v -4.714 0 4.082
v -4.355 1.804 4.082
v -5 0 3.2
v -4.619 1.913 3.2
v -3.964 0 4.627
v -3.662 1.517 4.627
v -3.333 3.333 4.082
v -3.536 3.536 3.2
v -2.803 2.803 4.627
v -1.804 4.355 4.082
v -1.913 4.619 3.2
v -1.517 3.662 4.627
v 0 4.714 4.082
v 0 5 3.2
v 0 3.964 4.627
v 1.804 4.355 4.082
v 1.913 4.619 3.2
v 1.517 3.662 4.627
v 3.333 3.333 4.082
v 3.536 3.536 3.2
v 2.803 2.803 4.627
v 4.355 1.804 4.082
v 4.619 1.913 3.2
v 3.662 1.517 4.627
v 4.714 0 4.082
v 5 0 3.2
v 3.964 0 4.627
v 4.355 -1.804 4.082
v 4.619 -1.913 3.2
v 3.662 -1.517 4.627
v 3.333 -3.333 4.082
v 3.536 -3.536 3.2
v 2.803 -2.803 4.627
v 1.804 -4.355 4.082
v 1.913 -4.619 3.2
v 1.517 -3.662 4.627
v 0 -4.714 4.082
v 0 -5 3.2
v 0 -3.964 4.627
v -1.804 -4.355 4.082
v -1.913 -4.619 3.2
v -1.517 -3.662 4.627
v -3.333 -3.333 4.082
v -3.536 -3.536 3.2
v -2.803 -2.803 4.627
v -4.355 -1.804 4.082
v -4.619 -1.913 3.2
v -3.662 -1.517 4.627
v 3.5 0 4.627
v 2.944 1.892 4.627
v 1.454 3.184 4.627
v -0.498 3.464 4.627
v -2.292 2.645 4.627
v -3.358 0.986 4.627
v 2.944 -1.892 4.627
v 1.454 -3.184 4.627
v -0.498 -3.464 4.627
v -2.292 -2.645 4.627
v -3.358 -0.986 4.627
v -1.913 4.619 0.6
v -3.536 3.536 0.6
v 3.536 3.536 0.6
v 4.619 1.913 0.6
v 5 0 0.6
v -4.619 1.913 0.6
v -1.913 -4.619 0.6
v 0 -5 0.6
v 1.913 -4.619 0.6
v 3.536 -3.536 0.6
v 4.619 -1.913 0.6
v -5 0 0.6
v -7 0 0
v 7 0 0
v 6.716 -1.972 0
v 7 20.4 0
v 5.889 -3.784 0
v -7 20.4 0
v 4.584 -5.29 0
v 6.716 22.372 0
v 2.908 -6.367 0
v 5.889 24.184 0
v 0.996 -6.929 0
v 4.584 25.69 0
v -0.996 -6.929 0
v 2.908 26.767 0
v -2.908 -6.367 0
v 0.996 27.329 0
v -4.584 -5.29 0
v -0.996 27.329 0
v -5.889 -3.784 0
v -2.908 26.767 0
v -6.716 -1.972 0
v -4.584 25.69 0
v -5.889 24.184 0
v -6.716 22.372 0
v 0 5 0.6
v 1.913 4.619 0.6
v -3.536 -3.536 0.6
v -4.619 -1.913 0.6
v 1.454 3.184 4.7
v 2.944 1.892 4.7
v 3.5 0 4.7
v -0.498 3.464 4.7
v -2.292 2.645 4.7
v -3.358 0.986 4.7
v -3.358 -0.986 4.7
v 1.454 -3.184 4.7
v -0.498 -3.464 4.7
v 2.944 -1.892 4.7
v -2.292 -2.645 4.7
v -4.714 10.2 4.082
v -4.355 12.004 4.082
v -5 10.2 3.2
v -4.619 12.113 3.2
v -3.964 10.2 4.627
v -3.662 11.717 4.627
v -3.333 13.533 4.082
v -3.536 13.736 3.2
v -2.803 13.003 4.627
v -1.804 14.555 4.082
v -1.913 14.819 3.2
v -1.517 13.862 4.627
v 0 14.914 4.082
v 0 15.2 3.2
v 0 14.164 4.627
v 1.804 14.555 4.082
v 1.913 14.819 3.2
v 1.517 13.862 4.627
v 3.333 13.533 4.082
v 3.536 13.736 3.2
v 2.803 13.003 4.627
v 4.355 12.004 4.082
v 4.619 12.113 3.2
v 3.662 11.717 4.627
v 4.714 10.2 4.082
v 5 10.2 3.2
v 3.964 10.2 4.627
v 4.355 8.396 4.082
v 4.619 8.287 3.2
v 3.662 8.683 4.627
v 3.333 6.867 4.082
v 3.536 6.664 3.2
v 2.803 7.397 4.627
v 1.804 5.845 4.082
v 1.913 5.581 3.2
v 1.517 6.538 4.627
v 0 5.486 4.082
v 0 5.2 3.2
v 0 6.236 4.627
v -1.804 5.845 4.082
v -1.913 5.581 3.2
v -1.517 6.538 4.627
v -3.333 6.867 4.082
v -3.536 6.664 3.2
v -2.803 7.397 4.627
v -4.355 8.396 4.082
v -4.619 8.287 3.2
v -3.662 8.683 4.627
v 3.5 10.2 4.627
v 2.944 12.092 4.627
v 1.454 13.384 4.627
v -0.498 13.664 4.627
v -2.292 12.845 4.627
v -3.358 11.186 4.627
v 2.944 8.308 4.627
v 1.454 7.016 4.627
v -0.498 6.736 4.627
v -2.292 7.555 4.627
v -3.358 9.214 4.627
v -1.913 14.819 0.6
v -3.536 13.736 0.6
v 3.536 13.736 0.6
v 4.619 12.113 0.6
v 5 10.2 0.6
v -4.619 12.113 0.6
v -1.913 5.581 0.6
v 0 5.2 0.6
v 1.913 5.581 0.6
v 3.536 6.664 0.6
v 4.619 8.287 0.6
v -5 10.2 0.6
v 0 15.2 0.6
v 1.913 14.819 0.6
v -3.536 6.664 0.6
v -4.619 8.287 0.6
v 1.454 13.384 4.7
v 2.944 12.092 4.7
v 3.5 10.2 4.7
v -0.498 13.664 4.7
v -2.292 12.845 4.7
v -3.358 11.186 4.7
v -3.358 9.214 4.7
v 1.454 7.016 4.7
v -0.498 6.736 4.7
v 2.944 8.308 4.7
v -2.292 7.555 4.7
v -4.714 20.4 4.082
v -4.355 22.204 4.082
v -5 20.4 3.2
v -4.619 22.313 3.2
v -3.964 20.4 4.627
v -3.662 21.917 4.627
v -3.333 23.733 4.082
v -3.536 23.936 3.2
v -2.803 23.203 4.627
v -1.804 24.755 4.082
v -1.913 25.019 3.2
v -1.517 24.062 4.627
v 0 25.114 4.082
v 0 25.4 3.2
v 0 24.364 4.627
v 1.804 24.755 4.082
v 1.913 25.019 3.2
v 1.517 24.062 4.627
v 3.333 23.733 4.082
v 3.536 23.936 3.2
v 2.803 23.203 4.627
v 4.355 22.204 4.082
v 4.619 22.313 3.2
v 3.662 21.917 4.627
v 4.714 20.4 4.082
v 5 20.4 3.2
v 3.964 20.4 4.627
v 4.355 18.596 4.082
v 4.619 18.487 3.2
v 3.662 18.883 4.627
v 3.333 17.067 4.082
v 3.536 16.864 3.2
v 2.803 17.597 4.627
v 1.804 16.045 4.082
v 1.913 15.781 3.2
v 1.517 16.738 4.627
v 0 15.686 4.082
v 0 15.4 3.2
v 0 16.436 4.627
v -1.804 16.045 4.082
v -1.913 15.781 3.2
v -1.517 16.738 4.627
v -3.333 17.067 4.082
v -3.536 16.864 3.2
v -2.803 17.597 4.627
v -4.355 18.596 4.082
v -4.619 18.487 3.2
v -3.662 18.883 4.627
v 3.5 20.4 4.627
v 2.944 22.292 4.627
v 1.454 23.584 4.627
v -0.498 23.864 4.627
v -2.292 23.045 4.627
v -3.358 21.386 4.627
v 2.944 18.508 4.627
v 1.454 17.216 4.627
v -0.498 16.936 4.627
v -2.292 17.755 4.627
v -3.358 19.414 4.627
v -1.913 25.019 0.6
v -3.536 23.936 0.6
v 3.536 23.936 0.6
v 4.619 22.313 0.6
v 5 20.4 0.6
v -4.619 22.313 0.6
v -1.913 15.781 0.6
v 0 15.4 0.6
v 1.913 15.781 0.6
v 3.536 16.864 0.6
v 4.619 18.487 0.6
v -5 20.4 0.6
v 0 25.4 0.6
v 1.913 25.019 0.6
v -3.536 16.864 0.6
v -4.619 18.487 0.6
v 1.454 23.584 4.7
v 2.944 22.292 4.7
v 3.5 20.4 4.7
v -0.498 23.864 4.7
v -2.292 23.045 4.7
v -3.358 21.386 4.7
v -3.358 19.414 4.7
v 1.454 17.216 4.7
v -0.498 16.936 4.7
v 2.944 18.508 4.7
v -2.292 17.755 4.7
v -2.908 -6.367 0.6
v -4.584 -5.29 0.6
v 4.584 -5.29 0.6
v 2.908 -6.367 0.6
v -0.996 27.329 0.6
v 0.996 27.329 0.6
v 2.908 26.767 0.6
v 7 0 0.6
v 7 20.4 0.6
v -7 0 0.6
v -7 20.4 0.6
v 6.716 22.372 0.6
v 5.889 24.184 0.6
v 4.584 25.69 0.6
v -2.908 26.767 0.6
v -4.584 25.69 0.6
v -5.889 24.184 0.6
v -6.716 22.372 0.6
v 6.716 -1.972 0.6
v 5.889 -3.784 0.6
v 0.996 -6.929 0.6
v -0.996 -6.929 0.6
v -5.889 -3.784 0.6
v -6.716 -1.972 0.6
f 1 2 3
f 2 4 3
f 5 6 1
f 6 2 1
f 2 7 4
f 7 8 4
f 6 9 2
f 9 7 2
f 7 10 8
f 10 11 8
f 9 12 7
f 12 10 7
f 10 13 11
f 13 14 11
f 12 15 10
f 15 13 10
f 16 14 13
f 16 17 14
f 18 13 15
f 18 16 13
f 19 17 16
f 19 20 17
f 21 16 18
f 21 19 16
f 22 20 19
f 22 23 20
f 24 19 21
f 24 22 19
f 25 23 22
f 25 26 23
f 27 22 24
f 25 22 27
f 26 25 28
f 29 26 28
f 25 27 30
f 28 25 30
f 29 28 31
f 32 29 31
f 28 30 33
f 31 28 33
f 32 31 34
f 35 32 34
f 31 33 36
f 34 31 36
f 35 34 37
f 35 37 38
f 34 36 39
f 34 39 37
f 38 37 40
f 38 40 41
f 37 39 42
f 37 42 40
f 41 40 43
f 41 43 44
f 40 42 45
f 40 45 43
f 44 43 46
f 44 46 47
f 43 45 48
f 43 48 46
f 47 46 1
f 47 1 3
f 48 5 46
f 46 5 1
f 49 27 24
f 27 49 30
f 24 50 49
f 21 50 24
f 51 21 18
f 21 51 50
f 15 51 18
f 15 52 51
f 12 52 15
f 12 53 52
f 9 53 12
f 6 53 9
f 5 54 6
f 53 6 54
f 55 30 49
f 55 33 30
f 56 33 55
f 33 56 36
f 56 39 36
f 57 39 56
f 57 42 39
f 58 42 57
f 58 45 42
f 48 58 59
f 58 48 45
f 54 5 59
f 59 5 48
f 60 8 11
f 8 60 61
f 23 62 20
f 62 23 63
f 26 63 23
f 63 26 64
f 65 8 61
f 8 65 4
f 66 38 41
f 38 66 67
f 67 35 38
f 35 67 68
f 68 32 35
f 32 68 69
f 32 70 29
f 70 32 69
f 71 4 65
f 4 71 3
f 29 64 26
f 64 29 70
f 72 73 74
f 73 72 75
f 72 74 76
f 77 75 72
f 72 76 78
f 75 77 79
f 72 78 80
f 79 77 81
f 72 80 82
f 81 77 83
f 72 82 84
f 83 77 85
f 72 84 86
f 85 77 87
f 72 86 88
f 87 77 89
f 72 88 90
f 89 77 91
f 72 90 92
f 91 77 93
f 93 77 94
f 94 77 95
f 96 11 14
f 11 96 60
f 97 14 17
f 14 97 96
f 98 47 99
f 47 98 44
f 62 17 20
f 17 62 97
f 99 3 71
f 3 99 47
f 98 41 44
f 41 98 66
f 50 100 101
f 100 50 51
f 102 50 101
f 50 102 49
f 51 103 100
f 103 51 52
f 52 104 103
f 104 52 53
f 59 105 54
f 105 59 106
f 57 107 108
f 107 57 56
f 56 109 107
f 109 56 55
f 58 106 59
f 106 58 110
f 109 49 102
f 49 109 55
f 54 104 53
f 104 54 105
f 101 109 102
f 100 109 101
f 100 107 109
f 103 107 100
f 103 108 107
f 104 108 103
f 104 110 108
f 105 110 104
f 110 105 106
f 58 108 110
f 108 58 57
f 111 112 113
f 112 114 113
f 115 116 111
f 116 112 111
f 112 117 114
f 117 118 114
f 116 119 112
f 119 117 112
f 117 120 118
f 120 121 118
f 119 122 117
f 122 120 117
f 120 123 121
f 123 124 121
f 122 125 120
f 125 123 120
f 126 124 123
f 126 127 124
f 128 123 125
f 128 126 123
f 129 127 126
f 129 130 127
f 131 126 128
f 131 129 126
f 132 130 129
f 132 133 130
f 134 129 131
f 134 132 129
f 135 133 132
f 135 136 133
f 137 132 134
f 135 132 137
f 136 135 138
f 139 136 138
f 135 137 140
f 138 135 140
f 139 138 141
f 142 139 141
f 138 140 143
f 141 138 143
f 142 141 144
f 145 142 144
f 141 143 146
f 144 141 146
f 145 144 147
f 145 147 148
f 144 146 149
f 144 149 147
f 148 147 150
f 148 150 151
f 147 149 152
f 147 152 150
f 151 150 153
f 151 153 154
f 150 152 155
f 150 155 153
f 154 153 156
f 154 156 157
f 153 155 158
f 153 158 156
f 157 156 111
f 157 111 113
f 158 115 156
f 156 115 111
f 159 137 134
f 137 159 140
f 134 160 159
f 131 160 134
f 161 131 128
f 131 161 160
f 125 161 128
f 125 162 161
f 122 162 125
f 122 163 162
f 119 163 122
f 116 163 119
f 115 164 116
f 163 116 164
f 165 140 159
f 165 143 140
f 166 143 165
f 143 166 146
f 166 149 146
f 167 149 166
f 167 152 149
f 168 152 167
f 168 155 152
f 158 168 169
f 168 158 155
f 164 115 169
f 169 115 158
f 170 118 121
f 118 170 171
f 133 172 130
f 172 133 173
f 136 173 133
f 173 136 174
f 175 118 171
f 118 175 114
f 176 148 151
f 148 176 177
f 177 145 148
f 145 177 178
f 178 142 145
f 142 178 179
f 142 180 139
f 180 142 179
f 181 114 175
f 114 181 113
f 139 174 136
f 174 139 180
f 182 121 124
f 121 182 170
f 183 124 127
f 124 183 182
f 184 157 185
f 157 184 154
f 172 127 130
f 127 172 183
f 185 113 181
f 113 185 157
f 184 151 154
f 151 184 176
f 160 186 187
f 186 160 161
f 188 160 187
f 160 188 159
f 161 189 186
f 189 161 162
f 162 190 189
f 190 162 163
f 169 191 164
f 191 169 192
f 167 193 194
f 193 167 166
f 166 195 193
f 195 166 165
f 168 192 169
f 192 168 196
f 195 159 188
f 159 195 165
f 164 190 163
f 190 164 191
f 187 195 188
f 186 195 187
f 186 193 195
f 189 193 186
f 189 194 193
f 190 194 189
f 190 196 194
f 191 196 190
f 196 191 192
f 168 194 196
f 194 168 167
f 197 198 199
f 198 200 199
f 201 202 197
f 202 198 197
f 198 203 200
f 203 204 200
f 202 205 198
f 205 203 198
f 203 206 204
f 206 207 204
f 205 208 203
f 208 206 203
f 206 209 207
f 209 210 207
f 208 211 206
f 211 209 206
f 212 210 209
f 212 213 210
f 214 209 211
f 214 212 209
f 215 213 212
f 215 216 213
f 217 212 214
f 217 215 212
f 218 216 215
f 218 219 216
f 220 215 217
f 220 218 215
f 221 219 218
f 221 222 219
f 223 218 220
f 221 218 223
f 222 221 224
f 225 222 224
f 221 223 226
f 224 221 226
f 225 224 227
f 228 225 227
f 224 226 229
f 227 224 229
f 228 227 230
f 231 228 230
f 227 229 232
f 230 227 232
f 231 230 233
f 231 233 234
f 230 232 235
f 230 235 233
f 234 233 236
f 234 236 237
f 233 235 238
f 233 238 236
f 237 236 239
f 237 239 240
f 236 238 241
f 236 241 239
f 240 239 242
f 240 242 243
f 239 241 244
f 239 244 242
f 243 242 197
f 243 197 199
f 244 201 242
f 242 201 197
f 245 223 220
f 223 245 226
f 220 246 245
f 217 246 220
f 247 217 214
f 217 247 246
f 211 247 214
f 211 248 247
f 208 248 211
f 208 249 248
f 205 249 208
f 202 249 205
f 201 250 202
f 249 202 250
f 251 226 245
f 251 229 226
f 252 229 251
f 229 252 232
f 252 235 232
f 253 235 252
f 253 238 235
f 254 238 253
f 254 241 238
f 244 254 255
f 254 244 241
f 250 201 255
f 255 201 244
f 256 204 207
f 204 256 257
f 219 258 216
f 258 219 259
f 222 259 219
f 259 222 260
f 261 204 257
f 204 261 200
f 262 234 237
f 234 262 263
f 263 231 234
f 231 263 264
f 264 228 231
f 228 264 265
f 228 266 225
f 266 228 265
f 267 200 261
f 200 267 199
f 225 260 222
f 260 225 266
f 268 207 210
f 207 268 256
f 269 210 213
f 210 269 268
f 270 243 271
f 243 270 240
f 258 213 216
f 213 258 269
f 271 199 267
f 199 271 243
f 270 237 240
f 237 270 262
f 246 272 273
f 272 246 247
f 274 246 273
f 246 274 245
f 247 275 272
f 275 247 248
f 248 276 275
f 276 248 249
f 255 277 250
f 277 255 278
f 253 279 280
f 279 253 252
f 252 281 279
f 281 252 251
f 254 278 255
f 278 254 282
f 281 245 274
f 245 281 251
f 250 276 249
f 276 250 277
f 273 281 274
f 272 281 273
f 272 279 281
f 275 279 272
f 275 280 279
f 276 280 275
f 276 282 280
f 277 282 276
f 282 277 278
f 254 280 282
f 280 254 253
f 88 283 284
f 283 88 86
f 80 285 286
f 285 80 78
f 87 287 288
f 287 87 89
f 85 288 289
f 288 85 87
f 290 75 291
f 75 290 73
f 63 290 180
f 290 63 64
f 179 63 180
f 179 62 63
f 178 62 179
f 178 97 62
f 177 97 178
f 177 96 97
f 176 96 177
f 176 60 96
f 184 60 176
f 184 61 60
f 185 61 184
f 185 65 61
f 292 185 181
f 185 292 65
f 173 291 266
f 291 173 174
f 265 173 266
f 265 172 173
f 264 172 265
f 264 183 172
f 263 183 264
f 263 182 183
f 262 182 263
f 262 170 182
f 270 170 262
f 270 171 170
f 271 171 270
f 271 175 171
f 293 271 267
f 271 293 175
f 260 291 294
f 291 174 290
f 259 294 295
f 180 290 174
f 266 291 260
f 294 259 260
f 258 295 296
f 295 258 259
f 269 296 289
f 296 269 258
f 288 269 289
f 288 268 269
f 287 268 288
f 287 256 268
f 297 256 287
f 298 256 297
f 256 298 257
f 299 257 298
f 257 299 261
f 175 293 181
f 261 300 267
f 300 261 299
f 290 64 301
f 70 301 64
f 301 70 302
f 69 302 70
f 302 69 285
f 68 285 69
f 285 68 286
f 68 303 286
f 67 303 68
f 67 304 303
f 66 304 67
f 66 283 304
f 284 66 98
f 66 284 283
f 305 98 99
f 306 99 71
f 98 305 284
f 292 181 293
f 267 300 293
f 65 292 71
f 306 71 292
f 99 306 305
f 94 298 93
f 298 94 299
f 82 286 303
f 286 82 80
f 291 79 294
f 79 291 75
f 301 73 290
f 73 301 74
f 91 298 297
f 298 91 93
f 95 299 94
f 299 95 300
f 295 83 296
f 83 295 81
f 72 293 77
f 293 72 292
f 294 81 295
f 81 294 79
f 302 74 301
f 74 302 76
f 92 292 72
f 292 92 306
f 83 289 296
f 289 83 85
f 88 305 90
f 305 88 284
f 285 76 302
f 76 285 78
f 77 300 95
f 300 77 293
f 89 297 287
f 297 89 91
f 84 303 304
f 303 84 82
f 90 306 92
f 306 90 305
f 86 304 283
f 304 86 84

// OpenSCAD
// file: tvRemoteControl-Buttons.scad
pitch=2.55;
width = 10;
thickness=0.6;
height=thickness + 4.1;
extra=2;
roundness=1.5;
textHeight=1;

module button(x,y)
{
    translate( [x*pitch, y*pitch] ) {
        difference() {
            union() {
                translate( [0,0,height-roundness] ) rotate_extrude( angle = 360, convexity = 6 ) {
                    translate( [width/2-roundness,0] ) circle( r=roundness, $fn=10 );
                }
                cylinder( d=width, h=height-roundness );
                cylinder( d=width-roundness*2, h=height );
            }
            translate( [0,0,height-textHeight] ) linear_extrude( textHeight+1 ) children();
        }
    }
}

module base(x,y)
{
    translate( [x*pitch, y*pitch] ) {
        cylinder( d=width+extra*2, thickness );
    }
}

module letter( t )
{
    text( t=t, halign="center", valign="center" );
}

module arrow()
{
    circle( d= width-roundness-2, $fn=3 );
}

module minus()
{
    square( [width-roundness-2, 2], center=true );
}

module plus()
{
    minus();
    rotate( 90 ) minus();
}
// main file
use <tvRemoteControl-Buttons.scad>;


module three()
{
    button(0,0);
    button(0,4);
    button(0,8);

    hull() {
        base(0,0);
        base(0,8);
    }
}


three();
